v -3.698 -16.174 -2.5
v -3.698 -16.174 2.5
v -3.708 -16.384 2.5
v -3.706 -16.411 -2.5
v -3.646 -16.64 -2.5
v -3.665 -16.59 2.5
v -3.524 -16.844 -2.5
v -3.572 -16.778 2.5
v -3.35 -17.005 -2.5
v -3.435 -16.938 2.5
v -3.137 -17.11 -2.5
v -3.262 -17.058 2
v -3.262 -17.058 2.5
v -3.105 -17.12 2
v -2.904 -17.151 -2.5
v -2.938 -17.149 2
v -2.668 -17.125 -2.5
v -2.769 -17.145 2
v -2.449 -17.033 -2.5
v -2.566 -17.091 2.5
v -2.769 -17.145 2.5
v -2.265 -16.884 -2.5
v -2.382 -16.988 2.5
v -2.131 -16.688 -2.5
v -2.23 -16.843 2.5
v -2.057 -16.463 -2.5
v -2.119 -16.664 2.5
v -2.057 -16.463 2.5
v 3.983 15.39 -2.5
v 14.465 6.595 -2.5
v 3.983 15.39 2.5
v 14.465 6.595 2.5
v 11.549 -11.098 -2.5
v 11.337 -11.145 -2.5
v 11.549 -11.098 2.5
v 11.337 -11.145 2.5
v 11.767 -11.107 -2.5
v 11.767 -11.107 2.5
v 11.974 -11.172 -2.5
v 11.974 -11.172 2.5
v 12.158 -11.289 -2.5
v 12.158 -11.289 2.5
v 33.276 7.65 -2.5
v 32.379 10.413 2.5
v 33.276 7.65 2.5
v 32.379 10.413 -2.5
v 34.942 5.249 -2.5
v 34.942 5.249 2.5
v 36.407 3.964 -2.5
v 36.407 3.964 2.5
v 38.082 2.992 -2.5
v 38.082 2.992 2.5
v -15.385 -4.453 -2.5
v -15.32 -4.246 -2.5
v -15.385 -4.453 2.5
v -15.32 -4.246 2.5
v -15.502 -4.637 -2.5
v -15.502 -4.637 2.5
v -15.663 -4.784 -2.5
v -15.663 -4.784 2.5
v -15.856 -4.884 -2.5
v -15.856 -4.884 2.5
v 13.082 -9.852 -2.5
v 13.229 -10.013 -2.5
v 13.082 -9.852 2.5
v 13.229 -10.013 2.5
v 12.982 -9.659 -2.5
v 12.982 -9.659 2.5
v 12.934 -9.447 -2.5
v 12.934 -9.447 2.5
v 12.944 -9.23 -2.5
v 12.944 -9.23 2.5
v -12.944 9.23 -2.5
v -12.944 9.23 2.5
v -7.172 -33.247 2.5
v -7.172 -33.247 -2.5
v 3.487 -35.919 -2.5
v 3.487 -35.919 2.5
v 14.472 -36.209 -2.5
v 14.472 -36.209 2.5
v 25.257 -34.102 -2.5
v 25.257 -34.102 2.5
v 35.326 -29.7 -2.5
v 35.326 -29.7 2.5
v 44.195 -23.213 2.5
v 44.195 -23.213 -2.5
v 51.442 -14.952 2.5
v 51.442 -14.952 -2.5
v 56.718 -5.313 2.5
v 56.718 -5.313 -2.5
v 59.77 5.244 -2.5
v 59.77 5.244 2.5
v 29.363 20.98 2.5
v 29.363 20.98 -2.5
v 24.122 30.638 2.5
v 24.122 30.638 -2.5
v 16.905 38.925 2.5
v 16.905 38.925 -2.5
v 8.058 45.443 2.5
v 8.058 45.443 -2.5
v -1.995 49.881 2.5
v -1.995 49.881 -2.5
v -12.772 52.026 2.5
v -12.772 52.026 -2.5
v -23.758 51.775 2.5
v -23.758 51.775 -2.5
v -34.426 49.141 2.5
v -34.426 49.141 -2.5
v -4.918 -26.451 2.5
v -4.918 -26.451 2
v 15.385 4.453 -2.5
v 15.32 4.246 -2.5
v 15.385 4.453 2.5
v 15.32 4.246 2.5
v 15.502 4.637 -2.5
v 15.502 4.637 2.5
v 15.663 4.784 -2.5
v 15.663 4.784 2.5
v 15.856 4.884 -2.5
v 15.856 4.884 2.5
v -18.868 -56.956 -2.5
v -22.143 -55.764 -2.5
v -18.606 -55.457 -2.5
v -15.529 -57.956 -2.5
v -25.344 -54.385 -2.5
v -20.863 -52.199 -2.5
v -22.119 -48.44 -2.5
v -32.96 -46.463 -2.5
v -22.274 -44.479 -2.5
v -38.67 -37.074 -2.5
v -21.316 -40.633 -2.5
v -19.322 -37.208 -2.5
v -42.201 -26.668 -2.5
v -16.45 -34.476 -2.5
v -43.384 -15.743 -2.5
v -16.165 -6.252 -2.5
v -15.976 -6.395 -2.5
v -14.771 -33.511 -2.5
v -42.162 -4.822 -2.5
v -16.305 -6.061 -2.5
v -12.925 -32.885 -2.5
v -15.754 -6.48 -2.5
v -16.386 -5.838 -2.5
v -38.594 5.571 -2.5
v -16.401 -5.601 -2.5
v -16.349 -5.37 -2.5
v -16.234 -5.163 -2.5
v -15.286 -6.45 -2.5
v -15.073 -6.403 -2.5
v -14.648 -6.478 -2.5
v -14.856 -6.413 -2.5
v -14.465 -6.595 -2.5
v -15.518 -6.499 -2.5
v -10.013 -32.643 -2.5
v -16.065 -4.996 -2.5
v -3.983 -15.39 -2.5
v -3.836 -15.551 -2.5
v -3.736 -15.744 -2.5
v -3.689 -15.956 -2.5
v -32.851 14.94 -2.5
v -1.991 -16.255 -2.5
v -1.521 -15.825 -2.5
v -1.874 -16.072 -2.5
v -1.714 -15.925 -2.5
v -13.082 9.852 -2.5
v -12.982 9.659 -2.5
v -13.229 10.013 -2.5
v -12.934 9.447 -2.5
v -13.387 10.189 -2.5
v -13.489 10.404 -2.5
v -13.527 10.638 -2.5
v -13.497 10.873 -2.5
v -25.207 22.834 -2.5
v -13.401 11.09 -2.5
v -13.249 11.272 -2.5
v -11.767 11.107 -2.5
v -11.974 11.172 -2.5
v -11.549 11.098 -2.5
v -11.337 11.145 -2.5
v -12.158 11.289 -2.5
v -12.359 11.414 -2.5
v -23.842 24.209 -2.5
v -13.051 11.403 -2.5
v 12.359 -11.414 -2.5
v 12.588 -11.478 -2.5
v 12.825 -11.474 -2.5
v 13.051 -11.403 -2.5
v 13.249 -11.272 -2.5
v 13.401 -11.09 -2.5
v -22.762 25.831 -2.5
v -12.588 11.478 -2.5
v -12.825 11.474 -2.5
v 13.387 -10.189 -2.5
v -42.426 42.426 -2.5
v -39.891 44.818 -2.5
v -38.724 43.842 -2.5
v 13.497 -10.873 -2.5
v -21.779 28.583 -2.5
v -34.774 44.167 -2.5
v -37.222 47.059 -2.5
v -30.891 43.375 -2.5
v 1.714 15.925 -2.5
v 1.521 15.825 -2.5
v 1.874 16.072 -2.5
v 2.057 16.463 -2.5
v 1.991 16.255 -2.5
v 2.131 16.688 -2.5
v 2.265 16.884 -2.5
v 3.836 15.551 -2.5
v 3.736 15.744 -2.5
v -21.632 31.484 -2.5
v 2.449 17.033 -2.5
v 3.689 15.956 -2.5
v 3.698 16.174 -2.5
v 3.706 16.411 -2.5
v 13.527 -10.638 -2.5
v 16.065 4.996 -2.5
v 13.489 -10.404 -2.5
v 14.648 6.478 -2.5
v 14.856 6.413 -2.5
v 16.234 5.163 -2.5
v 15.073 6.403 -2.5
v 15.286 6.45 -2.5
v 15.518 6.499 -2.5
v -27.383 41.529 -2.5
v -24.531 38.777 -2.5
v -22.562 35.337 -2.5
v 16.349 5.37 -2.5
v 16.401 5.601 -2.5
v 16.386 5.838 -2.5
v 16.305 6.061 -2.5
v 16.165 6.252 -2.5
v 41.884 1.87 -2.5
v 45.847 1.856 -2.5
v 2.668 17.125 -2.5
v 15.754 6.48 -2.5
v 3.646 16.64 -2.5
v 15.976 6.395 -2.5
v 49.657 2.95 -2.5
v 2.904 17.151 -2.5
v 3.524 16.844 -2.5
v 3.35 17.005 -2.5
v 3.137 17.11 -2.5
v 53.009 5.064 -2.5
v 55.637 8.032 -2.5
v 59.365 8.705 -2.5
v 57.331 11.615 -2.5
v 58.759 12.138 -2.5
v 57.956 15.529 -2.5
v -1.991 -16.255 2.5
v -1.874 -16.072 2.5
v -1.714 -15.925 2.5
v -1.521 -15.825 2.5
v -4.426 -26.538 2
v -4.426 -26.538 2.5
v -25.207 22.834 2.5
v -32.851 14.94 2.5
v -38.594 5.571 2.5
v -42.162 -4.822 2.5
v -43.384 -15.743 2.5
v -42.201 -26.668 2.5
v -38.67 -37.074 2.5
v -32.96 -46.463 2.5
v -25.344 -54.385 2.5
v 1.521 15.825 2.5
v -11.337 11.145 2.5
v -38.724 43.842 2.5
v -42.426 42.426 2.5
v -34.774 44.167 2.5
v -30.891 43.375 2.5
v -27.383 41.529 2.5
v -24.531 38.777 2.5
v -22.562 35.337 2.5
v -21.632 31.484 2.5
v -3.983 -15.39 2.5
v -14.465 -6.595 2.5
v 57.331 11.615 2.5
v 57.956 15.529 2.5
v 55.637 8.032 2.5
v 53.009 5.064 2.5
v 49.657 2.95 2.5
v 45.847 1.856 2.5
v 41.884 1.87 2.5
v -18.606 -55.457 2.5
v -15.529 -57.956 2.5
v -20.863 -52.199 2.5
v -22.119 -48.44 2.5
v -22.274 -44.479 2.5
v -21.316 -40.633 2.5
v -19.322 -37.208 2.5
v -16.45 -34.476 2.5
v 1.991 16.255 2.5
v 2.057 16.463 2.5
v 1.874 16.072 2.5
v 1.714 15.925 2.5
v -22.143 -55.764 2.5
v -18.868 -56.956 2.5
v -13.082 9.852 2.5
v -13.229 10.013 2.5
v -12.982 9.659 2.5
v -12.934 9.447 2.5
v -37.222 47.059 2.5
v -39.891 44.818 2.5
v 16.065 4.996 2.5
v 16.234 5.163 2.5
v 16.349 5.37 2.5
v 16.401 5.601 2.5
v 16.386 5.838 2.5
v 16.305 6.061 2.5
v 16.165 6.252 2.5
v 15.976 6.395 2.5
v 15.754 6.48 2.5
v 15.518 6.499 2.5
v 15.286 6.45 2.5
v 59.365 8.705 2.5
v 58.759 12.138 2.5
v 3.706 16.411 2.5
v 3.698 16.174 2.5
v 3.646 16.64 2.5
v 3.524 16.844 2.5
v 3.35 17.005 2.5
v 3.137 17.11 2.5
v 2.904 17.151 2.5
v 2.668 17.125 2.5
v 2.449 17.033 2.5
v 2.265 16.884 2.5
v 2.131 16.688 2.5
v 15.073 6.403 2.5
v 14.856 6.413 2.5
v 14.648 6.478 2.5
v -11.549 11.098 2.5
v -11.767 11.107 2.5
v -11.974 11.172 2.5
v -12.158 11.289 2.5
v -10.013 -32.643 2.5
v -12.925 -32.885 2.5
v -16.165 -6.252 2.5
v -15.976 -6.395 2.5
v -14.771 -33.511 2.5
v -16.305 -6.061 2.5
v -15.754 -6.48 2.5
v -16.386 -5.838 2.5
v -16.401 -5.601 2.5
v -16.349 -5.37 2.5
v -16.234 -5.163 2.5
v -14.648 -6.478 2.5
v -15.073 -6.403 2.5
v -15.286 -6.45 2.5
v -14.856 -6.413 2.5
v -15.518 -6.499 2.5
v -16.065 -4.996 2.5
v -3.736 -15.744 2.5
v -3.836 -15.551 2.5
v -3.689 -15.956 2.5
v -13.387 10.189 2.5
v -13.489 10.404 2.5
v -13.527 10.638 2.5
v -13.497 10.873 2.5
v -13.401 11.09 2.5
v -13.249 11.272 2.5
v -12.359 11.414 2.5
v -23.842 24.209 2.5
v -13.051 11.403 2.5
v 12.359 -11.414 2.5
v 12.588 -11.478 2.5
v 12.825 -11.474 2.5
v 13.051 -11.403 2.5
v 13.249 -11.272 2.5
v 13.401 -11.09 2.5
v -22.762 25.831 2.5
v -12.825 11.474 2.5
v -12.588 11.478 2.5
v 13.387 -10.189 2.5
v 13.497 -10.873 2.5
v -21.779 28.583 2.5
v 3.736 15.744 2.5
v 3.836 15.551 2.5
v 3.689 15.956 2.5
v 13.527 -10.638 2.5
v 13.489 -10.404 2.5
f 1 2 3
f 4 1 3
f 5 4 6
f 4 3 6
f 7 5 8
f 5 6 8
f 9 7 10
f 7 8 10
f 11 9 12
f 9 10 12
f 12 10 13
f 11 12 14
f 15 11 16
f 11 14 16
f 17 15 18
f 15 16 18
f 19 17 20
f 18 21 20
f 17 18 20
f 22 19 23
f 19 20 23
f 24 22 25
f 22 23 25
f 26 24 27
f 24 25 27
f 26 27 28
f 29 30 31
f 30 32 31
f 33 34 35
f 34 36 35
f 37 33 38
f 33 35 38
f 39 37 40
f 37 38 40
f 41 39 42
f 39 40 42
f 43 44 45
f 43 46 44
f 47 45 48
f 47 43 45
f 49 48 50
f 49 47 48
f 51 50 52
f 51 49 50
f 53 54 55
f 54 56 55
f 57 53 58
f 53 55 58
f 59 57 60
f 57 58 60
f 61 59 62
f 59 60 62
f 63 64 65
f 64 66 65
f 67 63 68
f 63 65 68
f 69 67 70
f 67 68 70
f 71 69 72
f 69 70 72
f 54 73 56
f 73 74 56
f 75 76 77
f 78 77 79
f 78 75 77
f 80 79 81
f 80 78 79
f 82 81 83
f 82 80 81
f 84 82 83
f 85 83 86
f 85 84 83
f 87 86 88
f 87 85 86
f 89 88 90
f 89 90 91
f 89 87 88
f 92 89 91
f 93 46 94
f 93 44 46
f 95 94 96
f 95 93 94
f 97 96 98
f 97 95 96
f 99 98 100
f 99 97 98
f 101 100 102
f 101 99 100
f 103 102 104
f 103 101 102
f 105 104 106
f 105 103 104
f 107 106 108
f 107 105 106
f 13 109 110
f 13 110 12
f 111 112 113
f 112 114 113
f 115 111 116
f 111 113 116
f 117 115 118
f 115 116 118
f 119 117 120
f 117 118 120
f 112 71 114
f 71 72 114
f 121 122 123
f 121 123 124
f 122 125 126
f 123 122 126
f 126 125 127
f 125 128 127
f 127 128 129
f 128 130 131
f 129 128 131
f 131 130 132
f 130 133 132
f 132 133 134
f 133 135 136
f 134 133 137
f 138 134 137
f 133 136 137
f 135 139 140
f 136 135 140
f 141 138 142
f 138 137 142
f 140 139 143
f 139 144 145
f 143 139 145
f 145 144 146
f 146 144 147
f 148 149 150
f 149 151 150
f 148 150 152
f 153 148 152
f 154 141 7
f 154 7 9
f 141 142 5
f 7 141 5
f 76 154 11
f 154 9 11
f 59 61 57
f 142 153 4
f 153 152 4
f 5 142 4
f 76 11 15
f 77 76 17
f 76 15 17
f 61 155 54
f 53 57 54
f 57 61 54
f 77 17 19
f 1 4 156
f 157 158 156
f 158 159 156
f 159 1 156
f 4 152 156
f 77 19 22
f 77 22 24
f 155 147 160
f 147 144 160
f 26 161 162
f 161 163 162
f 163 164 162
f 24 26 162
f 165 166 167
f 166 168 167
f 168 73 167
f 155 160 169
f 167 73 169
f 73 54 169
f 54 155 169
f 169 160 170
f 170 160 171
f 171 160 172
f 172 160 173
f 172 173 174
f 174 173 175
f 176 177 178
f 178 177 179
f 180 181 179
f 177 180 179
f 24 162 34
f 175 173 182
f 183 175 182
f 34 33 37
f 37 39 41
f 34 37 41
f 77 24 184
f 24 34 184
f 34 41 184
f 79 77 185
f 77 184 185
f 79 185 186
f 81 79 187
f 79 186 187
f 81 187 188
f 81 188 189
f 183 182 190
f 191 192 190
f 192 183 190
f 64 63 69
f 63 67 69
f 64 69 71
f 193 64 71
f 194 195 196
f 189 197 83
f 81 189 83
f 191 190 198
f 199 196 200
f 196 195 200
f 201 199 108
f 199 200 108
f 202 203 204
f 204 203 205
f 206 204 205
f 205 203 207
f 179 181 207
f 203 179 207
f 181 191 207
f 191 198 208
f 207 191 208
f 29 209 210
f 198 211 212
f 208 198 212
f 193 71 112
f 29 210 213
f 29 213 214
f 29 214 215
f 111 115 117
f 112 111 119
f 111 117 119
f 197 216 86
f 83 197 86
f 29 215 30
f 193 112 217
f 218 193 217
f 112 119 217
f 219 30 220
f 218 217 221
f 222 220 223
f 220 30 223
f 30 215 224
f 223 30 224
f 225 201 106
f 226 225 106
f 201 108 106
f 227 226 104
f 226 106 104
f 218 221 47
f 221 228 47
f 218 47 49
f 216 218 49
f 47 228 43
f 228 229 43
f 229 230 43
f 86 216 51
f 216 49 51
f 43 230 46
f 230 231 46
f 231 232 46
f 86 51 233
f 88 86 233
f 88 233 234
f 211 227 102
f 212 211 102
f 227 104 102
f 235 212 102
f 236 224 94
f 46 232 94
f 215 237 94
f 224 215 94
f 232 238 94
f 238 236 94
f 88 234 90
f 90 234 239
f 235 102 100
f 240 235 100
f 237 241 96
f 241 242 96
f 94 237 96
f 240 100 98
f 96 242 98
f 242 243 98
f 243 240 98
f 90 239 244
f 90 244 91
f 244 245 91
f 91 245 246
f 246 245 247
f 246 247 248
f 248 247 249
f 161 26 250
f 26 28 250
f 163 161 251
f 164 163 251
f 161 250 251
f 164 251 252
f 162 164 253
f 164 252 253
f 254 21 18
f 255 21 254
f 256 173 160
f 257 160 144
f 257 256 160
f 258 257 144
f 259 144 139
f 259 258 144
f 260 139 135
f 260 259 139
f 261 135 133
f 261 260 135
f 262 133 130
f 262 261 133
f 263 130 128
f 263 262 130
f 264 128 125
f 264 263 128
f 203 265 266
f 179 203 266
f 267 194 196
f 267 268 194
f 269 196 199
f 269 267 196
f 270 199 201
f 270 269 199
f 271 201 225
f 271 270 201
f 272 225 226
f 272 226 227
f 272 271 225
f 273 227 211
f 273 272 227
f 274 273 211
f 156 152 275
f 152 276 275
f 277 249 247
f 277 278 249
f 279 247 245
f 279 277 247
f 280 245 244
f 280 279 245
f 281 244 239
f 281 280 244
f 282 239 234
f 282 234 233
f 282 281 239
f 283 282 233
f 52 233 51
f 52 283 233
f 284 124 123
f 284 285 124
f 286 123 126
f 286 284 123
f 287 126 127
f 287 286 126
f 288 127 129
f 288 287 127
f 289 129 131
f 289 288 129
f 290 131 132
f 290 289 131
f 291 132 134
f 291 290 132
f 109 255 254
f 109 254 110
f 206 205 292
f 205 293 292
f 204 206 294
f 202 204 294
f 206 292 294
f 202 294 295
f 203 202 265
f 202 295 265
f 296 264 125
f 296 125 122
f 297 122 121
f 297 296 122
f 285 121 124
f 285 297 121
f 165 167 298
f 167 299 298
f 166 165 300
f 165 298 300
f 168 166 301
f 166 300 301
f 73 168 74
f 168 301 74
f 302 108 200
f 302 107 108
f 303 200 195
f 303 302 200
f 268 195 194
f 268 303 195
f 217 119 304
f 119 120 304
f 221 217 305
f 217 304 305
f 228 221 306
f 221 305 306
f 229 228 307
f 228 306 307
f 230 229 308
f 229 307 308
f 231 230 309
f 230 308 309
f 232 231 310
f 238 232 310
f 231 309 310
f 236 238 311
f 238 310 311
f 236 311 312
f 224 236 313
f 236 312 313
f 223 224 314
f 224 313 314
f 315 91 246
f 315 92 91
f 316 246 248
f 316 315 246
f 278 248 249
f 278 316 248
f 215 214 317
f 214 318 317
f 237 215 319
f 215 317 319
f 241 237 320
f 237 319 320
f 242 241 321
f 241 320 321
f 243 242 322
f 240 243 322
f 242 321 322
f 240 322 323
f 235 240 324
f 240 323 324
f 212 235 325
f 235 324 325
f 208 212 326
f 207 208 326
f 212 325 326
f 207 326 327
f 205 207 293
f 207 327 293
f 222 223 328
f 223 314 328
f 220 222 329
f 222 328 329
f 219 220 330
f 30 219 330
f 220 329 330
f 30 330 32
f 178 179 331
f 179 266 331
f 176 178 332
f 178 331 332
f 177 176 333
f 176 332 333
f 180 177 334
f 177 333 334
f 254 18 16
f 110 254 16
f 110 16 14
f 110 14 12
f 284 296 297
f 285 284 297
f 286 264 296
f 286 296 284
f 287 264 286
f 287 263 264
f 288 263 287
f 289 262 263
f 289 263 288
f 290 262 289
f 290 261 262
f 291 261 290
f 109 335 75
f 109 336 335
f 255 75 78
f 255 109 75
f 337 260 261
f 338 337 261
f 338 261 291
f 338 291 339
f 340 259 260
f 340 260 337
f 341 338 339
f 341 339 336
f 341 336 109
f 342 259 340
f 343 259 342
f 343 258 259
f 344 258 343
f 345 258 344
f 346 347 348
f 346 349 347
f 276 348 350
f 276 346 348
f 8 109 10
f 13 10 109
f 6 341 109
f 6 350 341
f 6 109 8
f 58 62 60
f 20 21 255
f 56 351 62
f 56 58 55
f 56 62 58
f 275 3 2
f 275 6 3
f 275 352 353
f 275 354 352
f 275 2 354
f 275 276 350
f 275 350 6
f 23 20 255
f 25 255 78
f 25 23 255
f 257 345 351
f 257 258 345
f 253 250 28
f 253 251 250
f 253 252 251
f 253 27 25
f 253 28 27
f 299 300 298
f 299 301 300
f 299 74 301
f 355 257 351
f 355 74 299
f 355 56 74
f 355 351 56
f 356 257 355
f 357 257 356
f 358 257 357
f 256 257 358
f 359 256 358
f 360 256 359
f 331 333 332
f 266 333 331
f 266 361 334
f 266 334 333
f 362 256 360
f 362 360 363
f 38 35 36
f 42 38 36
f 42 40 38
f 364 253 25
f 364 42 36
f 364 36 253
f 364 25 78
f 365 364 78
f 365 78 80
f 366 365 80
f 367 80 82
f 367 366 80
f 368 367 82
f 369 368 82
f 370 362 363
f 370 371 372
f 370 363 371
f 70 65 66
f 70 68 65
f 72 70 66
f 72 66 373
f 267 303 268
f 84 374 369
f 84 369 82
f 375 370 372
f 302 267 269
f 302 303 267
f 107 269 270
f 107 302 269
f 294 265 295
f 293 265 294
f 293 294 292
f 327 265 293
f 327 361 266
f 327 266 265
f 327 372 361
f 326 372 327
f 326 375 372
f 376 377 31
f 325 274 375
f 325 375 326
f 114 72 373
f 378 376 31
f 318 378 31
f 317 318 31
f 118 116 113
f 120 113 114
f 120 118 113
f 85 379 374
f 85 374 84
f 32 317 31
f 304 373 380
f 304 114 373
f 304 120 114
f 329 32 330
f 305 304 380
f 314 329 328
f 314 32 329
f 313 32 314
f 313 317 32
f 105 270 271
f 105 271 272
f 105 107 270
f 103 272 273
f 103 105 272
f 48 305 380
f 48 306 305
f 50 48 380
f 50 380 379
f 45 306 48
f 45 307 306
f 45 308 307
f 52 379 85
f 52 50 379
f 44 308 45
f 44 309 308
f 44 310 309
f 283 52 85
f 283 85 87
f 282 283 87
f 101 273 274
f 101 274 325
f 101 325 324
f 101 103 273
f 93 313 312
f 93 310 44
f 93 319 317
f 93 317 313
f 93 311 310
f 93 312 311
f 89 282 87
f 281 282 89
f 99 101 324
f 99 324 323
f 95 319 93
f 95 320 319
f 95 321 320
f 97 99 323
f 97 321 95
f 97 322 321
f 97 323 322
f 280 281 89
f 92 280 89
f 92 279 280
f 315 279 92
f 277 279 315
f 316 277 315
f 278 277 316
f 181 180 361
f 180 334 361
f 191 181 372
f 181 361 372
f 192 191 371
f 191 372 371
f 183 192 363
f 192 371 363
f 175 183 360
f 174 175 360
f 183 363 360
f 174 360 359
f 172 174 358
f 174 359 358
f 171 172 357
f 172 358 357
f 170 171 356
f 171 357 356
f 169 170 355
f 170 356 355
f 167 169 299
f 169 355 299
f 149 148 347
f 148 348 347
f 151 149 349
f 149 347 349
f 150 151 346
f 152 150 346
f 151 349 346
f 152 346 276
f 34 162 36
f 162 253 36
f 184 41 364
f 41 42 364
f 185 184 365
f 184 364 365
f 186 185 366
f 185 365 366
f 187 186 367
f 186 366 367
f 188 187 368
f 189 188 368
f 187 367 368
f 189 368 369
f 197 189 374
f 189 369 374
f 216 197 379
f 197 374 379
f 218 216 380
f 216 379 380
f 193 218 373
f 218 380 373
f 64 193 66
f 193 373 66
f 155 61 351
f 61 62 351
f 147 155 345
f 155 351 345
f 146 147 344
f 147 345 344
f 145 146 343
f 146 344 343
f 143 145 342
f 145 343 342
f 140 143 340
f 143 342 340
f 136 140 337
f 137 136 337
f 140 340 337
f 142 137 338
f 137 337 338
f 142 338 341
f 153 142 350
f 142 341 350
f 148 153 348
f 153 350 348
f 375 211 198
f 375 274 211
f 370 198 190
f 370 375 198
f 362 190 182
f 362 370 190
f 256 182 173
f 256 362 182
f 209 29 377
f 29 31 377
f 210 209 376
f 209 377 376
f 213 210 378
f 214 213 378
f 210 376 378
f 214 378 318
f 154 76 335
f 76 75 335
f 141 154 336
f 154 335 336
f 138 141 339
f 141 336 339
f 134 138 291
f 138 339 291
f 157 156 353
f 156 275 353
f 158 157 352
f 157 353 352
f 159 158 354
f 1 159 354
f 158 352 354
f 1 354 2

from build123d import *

# Parameters (mm, degrees)
BOSS_EXTRUDE1_DEPTH = 2.5
FILLET1_R           = 10
CUT_EXTRUDE1_DEPTH  = 0.5


with BuildPart() as part:
    # Sketch1 → Boss-Extrude1 (new, symmetric)
    with BuildSketch(Plane.XY):
        with BuildLine():
            ThreePointArc((-42.426406871, 42.426406871), (-26.29235792, 40.654943242), (-22.609103215, 24.847373735))
            ThreePointArc((-22.609103215, 24.847373735), (-43.353983992, -14.099744614), (-25.343982725, -54.38457998))
            ThreePointArc((-25.343982725, -54.38457998), (-20.514410827, -56.38403097), (-15.529142706, -57.955549577))
            ThreePointArc((-15.529142706, -57.955549577), (-22.062034677, -43.097321505), (-10.213905264, -32.003744609))
            ThreePointArc((-10.213905264, -32.003744609), (33.887729018, -30.495779185), (59.7704192, 5.243757117))
            ThreePointArc((59.7704192, 5.243757117), (59.087208601, 10.426014565), (57.955549577, 15.529142706))
            ThreePointArc((57.955549577, 15.529142706), (48.354392597, 2.442378263), (32.82300848, 7.156370874))
            ThreePointArc((32.82300848, 7.156370874), (9.466254973, 44.595523799), (-34.426436475, 49.140822863))
            ThreePointArc((-34.426436475, 49.140822863), (-38.572797774, 45.958016405), (-42.426406871, 42.426406871))
        make_face()
        with BuildLine():
            Line((1.521012626, 15.824554357), (-11.336990739, 11.14462386))
            ThreePointArc((-11.336990739, 11.14462386), (-11.76671434, 11.107027916), (-12.157663867, 11.289330674))
            ThreePointArc((-12.157663867, 11.289330674), (-13.331690578, 11.186616647), (-13.22897655, 10.012589936))
            ThreePointArc((-13.22897655, 10.012589936), (-12.981555707, 9.659236353), (-12.943959764, 9.229512752))
            Line((-12.943959764, 9.229512752), (-15.320022748, -4.245810053))
            ThreePointArc((-15.320022748, -4.245810053), (-15.502325506, -4.63675958), (-15.855679089, -4.884180422))
            ThreePointArc((-15.855679089, -4.884180422), (-16.353739487, -5.952274392), (-15.285645517, -6.45033479))
            ThreePointArc((-15.285645517, -6.45033479), (-14.855921916, -6.412738847), (-14.46497239, -6.595041605))
            Line((-14.46497239, -6.595041605), (-3.983032008, -15.390433913))
            ThreePointArc((-3.983032008, -15.390433913), (-3.735611166, -15.743787496), (-3.698015222, -16.173511097))
            ThreePointArc((-3.698015222, -16.173511097), (-3.02204891, -17.138891039), (-2.056668967, -16.462924726))
            ThreePointArc((-2.056668967, -16.462924726), (-1.874366209, -16.071975199), (-1.521012626, -15.824554357))
            Line((-1.521012626, -15.824554357), (11.336990739, -11.14462386))
            ThreePointArc((11.336990739, -11.14462386), (11.76671434, -11.107027916), (12.157663867, -11.289330674))
            ThreePointArc((12.157663867, -11.289330674), (13.331690578, -11.186616647), (13.22897655, -10.012589936))
            ThreePointArc((13.22897655, -10.012589936), (12.981555707, -9.659236353), (12.943959764, -9.229512752))
            Line((12.943959764, -9.229512752), (15.320022748, 4.245810053))
            ThreePointArc((15.320022748, 4.245810053), (15.502325506, 4.63675958), (15.855679089, 4.884180422))
            ThreePointArc((15.855679089, 4.884180422), (16.353739487, 5.952274392), (15.285645517, 6.45033479))
            ThreePointArc((15.285645517, 6.45033479), (14.855921916, 6.412738847), (14.46497239, 6.595041605))
            Line((14.46497239, 6.595041605), (3.983032008, 15.390433913))
            ThreePointArc((3.983032008, 15.390433913), (3.735611166, 15.743787496), (3.698015222, 16.173511097))
            ThreePointArc((3.698015222, 16.173511097), (3.02204891, 17.138891039), (2.056668967, 16.462924726))
            ThreePointArc((2.056668967, 16.462924726), (1.874366209, 16.071975199), (1.521012626, 15.824554357))
        make_face(mode=Mode.SUBTRACT)
    extrude(amount=BOSS_EXTRUDE1_DEPTH, both=True)

    # Fillet1
    fillet1_edges = [part.edges().sort_by_distance(p)[0] for p in [
        (32.82300848, 7.156370874, 0),
        (-10.213905264, -32.003744609, 0),
        (-22.609103215, 24.847373735, 0),
    ]]
    fillet(fillet1_edges, radius=FILLET1_R)

    # Sketch2 → Cut-Extrude1 (cut)
    with BuildSketch(Plane.XY.offset(2.5)):
        Polygon((-3.181426759, -16.603075118), (-2.689022882, -16.689899207), (-4.425504659, -26.537976737), (-4.917908536, -26.451152648), align=None)
    extrude(amount=-CUT_EXTRUDE1_DEPTH, mode=Mode.SUBTRACT)


solid = part.part
